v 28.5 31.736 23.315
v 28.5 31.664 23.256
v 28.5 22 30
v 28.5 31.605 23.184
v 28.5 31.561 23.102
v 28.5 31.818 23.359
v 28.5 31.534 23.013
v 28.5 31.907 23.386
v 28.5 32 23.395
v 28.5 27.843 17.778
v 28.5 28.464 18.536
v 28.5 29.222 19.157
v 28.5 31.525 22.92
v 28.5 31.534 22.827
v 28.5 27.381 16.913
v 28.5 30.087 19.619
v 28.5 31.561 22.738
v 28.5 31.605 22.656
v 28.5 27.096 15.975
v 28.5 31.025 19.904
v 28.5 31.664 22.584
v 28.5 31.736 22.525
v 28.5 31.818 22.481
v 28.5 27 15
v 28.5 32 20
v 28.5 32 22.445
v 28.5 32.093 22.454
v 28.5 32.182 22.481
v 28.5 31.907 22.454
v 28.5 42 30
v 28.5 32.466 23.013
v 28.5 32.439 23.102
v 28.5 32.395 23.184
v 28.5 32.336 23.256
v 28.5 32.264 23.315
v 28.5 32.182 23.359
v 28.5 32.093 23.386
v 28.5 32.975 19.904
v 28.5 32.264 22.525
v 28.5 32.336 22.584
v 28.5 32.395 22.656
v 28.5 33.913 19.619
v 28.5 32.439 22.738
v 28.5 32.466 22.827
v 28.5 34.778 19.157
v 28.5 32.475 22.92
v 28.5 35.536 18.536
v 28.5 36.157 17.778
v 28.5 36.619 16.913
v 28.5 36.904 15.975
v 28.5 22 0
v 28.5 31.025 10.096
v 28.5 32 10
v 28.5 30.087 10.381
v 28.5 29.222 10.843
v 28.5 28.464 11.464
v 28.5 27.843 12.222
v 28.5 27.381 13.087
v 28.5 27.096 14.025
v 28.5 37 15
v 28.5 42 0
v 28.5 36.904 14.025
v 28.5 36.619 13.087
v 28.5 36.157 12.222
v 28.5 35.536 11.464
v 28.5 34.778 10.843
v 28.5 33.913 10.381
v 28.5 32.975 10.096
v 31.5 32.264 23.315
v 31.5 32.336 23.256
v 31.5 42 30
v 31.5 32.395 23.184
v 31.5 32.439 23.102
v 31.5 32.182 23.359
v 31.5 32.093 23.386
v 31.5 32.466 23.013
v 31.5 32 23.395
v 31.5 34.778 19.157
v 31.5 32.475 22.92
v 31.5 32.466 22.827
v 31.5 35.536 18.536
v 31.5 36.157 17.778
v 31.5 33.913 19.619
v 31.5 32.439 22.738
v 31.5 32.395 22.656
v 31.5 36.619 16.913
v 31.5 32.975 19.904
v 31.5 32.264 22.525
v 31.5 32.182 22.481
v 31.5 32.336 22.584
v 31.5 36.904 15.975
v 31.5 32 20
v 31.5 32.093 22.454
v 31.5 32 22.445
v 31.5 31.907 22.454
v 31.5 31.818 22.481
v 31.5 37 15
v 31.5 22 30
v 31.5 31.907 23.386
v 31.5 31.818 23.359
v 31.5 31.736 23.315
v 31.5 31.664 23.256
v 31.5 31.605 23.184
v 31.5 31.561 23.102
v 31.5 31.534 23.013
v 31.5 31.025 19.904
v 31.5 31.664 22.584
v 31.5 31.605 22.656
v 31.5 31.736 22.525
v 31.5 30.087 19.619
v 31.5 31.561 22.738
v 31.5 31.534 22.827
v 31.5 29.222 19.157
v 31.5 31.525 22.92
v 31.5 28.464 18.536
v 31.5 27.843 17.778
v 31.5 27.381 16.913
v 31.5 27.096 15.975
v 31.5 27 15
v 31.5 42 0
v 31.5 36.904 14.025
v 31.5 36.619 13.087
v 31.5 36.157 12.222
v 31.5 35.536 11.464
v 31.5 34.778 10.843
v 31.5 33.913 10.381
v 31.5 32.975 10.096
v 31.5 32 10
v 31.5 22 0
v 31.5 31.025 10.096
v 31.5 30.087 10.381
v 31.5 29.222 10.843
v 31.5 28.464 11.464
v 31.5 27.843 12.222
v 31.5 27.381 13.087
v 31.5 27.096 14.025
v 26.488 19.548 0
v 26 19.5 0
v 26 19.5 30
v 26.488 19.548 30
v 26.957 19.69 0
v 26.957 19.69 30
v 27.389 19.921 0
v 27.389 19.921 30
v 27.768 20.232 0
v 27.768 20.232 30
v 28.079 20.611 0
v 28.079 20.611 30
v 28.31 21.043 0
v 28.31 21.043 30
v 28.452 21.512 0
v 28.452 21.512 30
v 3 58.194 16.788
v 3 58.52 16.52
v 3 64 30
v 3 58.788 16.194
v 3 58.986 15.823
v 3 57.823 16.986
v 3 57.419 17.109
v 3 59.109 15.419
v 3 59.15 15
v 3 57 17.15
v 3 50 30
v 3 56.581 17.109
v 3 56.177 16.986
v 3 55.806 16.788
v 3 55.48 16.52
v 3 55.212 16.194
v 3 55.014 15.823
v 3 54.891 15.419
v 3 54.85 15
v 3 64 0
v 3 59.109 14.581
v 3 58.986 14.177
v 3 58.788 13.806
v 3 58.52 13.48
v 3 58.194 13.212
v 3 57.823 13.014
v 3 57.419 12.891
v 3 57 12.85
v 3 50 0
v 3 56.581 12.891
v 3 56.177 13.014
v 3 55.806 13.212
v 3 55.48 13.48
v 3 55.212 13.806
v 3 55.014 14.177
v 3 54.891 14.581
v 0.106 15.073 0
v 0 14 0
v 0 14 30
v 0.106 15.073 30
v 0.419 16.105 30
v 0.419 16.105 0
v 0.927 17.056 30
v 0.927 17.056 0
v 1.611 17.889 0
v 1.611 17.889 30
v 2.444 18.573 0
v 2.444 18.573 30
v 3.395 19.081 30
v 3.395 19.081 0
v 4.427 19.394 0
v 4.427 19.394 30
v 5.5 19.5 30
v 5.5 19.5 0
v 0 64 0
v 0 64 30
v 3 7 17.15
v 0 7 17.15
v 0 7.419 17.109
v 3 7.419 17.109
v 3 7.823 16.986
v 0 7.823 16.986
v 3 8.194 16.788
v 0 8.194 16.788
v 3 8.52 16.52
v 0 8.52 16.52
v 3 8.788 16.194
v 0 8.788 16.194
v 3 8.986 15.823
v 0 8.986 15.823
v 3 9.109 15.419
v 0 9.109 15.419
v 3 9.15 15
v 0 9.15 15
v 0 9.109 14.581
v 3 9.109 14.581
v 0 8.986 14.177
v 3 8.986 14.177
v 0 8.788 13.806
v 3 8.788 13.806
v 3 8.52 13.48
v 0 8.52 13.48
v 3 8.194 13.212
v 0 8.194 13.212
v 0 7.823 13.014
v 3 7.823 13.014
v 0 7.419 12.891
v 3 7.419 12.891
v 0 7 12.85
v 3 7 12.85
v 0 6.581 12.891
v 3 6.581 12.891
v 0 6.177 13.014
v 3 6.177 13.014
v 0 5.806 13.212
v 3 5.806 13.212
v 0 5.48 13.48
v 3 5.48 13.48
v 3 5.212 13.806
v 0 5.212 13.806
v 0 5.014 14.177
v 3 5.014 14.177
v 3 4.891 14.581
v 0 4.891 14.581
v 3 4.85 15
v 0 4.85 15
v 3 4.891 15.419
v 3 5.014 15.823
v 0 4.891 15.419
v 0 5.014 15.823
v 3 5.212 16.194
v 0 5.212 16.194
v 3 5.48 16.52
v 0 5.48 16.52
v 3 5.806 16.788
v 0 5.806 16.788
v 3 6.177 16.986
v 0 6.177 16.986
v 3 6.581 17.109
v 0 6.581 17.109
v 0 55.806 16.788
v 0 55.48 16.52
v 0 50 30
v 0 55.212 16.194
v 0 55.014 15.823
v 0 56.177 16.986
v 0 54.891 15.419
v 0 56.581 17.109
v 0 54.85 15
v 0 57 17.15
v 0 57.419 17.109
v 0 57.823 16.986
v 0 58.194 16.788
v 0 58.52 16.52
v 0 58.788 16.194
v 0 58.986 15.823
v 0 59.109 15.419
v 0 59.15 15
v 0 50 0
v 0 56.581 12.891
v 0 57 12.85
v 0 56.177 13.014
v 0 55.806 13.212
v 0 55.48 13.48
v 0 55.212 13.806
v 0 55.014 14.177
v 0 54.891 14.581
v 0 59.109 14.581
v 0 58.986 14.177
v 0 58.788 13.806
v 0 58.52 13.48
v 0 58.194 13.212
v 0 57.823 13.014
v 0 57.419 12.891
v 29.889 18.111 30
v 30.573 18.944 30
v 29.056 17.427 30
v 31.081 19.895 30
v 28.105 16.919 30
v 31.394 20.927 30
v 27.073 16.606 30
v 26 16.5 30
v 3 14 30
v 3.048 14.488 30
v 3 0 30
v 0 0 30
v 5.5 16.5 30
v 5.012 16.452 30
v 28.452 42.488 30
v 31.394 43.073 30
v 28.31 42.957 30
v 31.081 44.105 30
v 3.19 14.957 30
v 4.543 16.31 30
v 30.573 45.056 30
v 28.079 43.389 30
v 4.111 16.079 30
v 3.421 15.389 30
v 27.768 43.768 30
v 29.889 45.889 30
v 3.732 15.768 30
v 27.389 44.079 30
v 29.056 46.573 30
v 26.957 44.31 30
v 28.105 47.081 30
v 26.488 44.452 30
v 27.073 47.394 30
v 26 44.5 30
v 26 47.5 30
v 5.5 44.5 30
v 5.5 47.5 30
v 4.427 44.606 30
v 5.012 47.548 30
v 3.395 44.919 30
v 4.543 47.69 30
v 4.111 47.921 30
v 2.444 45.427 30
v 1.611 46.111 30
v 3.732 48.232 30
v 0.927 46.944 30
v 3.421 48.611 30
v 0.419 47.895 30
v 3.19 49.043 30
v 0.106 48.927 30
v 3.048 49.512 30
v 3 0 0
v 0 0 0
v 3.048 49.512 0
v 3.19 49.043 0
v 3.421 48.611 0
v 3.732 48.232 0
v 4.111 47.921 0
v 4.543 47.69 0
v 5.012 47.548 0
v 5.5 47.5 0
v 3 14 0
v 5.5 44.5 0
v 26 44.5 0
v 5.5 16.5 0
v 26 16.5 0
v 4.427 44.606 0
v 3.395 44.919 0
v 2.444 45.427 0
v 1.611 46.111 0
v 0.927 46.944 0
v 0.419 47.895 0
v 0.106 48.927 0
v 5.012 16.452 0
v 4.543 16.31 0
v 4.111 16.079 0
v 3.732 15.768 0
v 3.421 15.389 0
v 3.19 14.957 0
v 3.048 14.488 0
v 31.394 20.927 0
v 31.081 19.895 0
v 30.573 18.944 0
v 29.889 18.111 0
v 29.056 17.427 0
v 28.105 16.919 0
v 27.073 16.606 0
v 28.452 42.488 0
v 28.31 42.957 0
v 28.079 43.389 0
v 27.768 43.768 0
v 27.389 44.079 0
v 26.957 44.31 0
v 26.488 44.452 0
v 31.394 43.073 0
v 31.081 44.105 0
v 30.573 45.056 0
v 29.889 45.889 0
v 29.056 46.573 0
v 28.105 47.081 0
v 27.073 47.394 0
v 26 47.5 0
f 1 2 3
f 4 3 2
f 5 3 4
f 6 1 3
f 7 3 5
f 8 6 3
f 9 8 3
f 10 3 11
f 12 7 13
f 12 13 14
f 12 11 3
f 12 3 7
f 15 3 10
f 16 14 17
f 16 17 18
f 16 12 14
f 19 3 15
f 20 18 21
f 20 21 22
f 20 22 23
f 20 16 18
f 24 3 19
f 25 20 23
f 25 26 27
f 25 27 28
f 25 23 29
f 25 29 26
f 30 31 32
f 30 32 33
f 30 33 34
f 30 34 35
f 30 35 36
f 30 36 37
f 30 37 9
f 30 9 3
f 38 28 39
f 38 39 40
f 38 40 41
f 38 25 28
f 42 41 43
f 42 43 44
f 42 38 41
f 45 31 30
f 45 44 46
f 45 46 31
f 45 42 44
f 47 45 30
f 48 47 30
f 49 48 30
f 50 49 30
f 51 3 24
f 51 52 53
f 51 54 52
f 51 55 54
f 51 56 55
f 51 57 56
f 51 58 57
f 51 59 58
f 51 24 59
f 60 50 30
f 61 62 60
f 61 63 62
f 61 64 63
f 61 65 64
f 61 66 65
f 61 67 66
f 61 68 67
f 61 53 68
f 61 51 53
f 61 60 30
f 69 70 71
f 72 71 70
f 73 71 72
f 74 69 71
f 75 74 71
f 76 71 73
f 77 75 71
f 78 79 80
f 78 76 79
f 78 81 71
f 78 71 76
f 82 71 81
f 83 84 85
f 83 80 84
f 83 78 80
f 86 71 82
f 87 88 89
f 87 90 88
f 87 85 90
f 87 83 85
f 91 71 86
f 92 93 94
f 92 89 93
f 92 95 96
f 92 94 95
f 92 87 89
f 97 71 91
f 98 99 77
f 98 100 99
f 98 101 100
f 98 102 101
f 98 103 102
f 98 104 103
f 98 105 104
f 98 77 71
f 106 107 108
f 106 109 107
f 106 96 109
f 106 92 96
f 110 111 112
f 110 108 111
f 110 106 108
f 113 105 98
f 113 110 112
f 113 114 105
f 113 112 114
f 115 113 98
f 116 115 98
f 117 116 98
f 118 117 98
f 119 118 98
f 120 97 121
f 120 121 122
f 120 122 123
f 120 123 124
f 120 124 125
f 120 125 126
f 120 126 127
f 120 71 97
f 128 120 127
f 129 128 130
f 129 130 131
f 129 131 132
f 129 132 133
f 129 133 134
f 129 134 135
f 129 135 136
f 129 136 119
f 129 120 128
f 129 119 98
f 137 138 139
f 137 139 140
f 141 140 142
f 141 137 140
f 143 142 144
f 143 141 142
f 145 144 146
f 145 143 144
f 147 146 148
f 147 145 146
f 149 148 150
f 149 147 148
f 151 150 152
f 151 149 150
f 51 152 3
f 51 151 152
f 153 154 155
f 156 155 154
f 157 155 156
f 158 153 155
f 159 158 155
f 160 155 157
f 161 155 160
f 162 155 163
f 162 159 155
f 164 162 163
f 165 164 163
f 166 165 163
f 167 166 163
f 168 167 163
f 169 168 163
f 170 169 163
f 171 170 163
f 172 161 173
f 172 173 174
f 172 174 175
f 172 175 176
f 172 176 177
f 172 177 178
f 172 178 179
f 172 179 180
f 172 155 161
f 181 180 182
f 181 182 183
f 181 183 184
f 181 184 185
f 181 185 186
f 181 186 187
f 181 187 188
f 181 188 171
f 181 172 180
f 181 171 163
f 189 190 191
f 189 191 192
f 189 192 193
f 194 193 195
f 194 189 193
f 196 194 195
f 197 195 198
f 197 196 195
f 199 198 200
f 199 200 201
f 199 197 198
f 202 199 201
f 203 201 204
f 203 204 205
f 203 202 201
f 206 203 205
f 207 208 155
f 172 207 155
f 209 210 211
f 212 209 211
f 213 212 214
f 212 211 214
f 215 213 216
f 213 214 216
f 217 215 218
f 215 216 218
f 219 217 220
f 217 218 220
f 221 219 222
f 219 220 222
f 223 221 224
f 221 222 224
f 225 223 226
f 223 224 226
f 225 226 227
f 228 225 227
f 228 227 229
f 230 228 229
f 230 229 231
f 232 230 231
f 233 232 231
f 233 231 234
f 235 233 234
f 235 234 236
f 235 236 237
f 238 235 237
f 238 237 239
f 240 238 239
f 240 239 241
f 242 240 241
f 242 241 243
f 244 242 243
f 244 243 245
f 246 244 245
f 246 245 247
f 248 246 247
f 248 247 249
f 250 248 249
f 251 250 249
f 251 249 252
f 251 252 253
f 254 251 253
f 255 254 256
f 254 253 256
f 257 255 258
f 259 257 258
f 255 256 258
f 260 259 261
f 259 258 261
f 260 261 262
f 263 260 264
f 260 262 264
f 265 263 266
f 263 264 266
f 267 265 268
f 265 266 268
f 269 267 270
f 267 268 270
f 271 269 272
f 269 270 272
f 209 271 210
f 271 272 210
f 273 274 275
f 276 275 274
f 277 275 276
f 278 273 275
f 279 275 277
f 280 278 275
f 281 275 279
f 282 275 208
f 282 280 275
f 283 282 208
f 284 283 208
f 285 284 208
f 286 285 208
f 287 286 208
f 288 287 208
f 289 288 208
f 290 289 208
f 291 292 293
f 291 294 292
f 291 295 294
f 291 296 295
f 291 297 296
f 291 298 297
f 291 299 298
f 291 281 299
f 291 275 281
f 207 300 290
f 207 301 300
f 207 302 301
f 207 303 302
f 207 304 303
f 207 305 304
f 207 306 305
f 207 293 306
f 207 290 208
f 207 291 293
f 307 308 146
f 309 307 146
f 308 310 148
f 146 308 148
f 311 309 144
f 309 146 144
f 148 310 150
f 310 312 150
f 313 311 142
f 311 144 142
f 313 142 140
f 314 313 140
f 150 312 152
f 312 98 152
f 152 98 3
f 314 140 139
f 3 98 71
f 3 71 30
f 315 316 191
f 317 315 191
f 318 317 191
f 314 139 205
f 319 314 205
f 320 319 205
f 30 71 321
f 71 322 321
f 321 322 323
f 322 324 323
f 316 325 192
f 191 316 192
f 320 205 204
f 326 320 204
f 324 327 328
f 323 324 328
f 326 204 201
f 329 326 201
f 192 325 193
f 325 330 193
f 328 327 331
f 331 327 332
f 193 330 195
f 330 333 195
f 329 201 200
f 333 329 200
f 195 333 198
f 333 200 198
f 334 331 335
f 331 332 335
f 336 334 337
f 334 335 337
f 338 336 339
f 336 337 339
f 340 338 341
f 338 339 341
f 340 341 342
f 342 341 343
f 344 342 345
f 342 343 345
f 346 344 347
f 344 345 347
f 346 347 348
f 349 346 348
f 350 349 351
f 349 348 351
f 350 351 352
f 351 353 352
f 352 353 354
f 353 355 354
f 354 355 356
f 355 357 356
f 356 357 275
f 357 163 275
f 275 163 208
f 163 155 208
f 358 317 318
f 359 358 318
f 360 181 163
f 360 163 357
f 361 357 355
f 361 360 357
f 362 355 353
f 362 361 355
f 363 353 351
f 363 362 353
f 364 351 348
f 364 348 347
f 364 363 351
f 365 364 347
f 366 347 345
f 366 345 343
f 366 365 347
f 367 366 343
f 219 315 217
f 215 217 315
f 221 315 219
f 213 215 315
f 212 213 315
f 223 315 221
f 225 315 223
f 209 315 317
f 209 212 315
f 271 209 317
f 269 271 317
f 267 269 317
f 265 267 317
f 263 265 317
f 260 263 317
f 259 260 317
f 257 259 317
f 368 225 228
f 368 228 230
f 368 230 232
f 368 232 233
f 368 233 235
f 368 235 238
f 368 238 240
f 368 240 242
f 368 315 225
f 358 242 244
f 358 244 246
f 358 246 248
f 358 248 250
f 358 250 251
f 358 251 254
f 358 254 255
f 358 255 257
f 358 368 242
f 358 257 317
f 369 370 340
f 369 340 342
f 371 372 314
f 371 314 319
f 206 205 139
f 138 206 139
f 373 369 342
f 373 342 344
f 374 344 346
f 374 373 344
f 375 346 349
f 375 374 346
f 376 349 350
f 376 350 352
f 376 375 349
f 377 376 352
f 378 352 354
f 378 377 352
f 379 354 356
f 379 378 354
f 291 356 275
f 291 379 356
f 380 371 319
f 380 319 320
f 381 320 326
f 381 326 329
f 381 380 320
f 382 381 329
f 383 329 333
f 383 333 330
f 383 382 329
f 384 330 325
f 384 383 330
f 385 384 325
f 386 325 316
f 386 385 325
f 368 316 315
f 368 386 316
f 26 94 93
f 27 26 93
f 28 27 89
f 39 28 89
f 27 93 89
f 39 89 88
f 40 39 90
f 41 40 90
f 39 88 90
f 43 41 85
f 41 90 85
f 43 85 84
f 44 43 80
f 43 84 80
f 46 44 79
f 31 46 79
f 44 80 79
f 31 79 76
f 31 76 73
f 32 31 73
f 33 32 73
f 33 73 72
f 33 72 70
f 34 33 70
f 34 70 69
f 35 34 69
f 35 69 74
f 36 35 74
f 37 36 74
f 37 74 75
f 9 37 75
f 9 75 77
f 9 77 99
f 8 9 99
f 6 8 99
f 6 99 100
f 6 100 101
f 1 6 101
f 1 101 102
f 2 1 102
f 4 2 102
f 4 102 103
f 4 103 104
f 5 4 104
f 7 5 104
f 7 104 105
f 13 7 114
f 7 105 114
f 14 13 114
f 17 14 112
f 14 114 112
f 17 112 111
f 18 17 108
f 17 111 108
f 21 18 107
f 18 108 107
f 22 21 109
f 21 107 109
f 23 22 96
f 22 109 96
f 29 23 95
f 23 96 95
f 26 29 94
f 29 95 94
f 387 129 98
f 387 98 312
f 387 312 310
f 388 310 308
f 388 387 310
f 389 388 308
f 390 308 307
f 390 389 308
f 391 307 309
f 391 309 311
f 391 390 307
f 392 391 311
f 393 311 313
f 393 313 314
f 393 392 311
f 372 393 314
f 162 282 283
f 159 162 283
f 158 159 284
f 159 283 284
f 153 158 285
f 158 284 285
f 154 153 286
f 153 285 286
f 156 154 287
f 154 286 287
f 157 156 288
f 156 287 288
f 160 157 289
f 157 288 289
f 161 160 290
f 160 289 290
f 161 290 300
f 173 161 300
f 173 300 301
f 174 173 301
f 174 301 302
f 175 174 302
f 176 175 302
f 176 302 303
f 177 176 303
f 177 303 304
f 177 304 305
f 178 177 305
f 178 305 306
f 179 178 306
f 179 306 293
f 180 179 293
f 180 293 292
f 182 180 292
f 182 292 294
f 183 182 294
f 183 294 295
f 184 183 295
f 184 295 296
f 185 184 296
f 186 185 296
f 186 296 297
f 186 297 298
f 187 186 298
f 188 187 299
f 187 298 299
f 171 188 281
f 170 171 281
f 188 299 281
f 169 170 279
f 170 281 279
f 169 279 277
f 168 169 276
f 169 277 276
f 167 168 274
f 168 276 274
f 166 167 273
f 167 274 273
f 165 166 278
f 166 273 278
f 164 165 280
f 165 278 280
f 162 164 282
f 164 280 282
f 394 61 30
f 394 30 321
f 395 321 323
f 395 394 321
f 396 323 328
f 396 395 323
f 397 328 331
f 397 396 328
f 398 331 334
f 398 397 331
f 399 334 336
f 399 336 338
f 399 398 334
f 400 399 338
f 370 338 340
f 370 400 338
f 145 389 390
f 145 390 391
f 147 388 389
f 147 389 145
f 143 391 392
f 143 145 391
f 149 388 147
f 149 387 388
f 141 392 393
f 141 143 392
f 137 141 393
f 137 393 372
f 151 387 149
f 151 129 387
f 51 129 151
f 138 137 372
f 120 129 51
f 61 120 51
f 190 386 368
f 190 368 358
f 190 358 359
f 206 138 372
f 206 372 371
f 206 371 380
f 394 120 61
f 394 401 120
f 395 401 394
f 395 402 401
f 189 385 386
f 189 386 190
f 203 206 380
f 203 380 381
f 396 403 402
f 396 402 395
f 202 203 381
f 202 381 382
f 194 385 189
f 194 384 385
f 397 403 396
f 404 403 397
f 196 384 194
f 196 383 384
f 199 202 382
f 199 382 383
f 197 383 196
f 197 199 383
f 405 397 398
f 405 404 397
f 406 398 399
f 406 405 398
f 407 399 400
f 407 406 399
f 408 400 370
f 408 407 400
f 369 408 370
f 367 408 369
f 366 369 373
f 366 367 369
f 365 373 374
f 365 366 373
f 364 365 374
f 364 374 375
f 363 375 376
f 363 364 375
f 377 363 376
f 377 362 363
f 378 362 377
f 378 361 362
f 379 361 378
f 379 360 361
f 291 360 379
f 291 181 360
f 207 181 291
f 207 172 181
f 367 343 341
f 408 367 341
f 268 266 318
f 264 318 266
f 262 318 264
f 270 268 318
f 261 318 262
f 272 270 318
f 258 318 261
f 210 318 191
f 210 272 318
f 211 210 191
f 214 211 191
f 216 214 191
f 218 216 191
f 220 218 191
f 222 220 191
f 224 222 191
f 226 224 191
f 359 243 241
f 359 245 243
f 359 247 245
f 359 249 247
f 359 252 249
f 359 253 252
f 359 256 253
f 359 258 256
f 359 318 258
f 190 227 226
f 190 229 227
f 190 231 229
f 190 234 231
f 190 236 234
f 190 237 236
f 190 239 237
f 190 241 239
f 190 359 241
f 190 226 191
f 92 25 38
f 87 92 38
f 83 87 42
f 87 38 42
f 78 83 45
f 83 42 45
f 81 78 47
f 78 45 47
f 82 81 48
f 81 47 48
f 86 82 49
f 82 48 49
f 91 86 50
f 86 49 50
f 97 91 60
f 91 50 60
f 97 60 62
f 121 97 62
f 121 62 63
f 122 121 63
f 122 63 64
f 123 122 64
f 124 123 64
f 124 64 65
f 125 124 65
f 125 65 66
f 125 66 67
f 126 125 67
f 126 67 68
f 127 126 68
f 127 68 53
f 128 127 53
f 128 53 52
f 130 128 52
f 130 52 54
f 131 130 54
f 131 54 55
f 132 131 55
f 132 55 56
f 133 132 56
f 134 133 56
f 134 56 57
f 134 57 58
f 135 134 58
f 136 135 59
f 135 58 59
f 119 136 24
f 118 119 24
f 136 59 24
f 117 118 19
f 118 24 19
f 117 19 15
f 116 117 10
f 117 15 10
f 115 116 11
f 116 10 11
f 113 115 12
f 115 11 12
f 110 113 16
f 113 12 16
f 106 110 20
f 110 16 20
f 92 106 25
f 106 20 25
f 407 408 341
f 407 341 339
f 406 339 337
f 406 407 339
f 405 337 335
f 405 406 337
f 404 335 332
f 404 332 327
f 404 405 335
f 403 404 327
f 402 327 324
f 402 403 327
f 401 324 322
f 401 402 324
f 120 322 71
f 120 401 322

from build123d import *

# Parameters (mm, degrees)
BOSS_EXTRUDE1_DEPTH       = 30
M4_CLEARANCE_HOLE1_D      = 4.3
M4_CLEARANCE_HOLE1_DEPTH  = 7
M10_CLEARANCE_HOLE1_D     = 10
M10_CLEARANCE_HOLE1_DEPTH = 7
SKETCH6_R                 = 0.475
CUT_EXTRUDE1_DEPTH        = 10


with BuildPart() as part:
    # Sketch1 → Boss-Extrude1 (new body)
    with BuildSketch(Plane.XY):
        with BuildLine():
            Line((0, 0), (0, 14))
            ThreePointArc((0, 14), (1.610912703, 17.889087297), (5.5, 19.5))
            Line((5.5, 19.5), (26, 19.5))
            ThreePointArc((26, 19.5), (27.767766953, 20.232233047), (28.5, 22))
            Line((28.5, 22), (28.5, 42))
            ThreePointArc((28.5, 42), (27.767766953, 43.767766953), (26, 44.5))
            Line((26, 44.5), (5.5, 44.5))
            ThreePointArc((5.5, 44.5), (1.610912703, 46.110912703), (0, 50))
            Line((0, 50), (0, 64))
            Line((0, 64), (3, 64))
            Line((3, 64), (3, 50))
            ThreePointArc((3, 50), (3.732233047, 48.232233047), (5.5, 47.5))
            Line((5.5, 47.5), (26, 47.5))
            ThreePointArc((26, 47.5), (29.889087297, 45.889087297), (31.5, 42))
            Line((31.5, 42), (31.5, 22))
            ThreePointArc((31.5, 22), (29.889087297, 18.110912703), (26, 16.5))
            Line((26, 16.5), (5.5, 16.5))
            ThreePointArc((5.5, 16.5), (3.732233047, 15.767766953), (3, 14))
            Line((3, 14), (3, 0))
            Line((3, 0), (0, 0))
        make_face()
    extrude(amount=BOSS_EXTRUDE1_DEPTH)

    # M4 Clearance Hole1
    with Locations(Plane(origin=(3, 0, 0), x_dir=(0, 0, -1), z_dir=(1, 0, 0))):
        with Locations((-15, 57), (-15, 7)):
            Hole(M4_CLEARANCE_HOLE1_D / 2, depth=M4_CLEARANCE_HOLE1_DEPTH)

    # M10 Clearance Hole1
    with Locations(Plane(origin=(31.5, 0, 0), x_dir=(0, 0, -1), z_dir=(1, 0, 0))):
        with Locations((-15, 32)):
            Hole(M10_CLEARANCE_HOLE1_D / 2, depth=M10_CLEARANCE_HOLE1_DEPTH)

    # Sketch6 → Cut-Extrude1 (cut)
    with BuildSketch(Plane(origin=(31.5, 0, 0), x_dir=(0, 0, -1), z_dir=(1, 0, 0))):
        with Locations((-22.92, 32)):
            Circle(SKETCH6_R)
    extrude(amount=-CUT_EXTRUDE1_DEPTH, mode=Mode.SUBTRACT)


solid = part.part
